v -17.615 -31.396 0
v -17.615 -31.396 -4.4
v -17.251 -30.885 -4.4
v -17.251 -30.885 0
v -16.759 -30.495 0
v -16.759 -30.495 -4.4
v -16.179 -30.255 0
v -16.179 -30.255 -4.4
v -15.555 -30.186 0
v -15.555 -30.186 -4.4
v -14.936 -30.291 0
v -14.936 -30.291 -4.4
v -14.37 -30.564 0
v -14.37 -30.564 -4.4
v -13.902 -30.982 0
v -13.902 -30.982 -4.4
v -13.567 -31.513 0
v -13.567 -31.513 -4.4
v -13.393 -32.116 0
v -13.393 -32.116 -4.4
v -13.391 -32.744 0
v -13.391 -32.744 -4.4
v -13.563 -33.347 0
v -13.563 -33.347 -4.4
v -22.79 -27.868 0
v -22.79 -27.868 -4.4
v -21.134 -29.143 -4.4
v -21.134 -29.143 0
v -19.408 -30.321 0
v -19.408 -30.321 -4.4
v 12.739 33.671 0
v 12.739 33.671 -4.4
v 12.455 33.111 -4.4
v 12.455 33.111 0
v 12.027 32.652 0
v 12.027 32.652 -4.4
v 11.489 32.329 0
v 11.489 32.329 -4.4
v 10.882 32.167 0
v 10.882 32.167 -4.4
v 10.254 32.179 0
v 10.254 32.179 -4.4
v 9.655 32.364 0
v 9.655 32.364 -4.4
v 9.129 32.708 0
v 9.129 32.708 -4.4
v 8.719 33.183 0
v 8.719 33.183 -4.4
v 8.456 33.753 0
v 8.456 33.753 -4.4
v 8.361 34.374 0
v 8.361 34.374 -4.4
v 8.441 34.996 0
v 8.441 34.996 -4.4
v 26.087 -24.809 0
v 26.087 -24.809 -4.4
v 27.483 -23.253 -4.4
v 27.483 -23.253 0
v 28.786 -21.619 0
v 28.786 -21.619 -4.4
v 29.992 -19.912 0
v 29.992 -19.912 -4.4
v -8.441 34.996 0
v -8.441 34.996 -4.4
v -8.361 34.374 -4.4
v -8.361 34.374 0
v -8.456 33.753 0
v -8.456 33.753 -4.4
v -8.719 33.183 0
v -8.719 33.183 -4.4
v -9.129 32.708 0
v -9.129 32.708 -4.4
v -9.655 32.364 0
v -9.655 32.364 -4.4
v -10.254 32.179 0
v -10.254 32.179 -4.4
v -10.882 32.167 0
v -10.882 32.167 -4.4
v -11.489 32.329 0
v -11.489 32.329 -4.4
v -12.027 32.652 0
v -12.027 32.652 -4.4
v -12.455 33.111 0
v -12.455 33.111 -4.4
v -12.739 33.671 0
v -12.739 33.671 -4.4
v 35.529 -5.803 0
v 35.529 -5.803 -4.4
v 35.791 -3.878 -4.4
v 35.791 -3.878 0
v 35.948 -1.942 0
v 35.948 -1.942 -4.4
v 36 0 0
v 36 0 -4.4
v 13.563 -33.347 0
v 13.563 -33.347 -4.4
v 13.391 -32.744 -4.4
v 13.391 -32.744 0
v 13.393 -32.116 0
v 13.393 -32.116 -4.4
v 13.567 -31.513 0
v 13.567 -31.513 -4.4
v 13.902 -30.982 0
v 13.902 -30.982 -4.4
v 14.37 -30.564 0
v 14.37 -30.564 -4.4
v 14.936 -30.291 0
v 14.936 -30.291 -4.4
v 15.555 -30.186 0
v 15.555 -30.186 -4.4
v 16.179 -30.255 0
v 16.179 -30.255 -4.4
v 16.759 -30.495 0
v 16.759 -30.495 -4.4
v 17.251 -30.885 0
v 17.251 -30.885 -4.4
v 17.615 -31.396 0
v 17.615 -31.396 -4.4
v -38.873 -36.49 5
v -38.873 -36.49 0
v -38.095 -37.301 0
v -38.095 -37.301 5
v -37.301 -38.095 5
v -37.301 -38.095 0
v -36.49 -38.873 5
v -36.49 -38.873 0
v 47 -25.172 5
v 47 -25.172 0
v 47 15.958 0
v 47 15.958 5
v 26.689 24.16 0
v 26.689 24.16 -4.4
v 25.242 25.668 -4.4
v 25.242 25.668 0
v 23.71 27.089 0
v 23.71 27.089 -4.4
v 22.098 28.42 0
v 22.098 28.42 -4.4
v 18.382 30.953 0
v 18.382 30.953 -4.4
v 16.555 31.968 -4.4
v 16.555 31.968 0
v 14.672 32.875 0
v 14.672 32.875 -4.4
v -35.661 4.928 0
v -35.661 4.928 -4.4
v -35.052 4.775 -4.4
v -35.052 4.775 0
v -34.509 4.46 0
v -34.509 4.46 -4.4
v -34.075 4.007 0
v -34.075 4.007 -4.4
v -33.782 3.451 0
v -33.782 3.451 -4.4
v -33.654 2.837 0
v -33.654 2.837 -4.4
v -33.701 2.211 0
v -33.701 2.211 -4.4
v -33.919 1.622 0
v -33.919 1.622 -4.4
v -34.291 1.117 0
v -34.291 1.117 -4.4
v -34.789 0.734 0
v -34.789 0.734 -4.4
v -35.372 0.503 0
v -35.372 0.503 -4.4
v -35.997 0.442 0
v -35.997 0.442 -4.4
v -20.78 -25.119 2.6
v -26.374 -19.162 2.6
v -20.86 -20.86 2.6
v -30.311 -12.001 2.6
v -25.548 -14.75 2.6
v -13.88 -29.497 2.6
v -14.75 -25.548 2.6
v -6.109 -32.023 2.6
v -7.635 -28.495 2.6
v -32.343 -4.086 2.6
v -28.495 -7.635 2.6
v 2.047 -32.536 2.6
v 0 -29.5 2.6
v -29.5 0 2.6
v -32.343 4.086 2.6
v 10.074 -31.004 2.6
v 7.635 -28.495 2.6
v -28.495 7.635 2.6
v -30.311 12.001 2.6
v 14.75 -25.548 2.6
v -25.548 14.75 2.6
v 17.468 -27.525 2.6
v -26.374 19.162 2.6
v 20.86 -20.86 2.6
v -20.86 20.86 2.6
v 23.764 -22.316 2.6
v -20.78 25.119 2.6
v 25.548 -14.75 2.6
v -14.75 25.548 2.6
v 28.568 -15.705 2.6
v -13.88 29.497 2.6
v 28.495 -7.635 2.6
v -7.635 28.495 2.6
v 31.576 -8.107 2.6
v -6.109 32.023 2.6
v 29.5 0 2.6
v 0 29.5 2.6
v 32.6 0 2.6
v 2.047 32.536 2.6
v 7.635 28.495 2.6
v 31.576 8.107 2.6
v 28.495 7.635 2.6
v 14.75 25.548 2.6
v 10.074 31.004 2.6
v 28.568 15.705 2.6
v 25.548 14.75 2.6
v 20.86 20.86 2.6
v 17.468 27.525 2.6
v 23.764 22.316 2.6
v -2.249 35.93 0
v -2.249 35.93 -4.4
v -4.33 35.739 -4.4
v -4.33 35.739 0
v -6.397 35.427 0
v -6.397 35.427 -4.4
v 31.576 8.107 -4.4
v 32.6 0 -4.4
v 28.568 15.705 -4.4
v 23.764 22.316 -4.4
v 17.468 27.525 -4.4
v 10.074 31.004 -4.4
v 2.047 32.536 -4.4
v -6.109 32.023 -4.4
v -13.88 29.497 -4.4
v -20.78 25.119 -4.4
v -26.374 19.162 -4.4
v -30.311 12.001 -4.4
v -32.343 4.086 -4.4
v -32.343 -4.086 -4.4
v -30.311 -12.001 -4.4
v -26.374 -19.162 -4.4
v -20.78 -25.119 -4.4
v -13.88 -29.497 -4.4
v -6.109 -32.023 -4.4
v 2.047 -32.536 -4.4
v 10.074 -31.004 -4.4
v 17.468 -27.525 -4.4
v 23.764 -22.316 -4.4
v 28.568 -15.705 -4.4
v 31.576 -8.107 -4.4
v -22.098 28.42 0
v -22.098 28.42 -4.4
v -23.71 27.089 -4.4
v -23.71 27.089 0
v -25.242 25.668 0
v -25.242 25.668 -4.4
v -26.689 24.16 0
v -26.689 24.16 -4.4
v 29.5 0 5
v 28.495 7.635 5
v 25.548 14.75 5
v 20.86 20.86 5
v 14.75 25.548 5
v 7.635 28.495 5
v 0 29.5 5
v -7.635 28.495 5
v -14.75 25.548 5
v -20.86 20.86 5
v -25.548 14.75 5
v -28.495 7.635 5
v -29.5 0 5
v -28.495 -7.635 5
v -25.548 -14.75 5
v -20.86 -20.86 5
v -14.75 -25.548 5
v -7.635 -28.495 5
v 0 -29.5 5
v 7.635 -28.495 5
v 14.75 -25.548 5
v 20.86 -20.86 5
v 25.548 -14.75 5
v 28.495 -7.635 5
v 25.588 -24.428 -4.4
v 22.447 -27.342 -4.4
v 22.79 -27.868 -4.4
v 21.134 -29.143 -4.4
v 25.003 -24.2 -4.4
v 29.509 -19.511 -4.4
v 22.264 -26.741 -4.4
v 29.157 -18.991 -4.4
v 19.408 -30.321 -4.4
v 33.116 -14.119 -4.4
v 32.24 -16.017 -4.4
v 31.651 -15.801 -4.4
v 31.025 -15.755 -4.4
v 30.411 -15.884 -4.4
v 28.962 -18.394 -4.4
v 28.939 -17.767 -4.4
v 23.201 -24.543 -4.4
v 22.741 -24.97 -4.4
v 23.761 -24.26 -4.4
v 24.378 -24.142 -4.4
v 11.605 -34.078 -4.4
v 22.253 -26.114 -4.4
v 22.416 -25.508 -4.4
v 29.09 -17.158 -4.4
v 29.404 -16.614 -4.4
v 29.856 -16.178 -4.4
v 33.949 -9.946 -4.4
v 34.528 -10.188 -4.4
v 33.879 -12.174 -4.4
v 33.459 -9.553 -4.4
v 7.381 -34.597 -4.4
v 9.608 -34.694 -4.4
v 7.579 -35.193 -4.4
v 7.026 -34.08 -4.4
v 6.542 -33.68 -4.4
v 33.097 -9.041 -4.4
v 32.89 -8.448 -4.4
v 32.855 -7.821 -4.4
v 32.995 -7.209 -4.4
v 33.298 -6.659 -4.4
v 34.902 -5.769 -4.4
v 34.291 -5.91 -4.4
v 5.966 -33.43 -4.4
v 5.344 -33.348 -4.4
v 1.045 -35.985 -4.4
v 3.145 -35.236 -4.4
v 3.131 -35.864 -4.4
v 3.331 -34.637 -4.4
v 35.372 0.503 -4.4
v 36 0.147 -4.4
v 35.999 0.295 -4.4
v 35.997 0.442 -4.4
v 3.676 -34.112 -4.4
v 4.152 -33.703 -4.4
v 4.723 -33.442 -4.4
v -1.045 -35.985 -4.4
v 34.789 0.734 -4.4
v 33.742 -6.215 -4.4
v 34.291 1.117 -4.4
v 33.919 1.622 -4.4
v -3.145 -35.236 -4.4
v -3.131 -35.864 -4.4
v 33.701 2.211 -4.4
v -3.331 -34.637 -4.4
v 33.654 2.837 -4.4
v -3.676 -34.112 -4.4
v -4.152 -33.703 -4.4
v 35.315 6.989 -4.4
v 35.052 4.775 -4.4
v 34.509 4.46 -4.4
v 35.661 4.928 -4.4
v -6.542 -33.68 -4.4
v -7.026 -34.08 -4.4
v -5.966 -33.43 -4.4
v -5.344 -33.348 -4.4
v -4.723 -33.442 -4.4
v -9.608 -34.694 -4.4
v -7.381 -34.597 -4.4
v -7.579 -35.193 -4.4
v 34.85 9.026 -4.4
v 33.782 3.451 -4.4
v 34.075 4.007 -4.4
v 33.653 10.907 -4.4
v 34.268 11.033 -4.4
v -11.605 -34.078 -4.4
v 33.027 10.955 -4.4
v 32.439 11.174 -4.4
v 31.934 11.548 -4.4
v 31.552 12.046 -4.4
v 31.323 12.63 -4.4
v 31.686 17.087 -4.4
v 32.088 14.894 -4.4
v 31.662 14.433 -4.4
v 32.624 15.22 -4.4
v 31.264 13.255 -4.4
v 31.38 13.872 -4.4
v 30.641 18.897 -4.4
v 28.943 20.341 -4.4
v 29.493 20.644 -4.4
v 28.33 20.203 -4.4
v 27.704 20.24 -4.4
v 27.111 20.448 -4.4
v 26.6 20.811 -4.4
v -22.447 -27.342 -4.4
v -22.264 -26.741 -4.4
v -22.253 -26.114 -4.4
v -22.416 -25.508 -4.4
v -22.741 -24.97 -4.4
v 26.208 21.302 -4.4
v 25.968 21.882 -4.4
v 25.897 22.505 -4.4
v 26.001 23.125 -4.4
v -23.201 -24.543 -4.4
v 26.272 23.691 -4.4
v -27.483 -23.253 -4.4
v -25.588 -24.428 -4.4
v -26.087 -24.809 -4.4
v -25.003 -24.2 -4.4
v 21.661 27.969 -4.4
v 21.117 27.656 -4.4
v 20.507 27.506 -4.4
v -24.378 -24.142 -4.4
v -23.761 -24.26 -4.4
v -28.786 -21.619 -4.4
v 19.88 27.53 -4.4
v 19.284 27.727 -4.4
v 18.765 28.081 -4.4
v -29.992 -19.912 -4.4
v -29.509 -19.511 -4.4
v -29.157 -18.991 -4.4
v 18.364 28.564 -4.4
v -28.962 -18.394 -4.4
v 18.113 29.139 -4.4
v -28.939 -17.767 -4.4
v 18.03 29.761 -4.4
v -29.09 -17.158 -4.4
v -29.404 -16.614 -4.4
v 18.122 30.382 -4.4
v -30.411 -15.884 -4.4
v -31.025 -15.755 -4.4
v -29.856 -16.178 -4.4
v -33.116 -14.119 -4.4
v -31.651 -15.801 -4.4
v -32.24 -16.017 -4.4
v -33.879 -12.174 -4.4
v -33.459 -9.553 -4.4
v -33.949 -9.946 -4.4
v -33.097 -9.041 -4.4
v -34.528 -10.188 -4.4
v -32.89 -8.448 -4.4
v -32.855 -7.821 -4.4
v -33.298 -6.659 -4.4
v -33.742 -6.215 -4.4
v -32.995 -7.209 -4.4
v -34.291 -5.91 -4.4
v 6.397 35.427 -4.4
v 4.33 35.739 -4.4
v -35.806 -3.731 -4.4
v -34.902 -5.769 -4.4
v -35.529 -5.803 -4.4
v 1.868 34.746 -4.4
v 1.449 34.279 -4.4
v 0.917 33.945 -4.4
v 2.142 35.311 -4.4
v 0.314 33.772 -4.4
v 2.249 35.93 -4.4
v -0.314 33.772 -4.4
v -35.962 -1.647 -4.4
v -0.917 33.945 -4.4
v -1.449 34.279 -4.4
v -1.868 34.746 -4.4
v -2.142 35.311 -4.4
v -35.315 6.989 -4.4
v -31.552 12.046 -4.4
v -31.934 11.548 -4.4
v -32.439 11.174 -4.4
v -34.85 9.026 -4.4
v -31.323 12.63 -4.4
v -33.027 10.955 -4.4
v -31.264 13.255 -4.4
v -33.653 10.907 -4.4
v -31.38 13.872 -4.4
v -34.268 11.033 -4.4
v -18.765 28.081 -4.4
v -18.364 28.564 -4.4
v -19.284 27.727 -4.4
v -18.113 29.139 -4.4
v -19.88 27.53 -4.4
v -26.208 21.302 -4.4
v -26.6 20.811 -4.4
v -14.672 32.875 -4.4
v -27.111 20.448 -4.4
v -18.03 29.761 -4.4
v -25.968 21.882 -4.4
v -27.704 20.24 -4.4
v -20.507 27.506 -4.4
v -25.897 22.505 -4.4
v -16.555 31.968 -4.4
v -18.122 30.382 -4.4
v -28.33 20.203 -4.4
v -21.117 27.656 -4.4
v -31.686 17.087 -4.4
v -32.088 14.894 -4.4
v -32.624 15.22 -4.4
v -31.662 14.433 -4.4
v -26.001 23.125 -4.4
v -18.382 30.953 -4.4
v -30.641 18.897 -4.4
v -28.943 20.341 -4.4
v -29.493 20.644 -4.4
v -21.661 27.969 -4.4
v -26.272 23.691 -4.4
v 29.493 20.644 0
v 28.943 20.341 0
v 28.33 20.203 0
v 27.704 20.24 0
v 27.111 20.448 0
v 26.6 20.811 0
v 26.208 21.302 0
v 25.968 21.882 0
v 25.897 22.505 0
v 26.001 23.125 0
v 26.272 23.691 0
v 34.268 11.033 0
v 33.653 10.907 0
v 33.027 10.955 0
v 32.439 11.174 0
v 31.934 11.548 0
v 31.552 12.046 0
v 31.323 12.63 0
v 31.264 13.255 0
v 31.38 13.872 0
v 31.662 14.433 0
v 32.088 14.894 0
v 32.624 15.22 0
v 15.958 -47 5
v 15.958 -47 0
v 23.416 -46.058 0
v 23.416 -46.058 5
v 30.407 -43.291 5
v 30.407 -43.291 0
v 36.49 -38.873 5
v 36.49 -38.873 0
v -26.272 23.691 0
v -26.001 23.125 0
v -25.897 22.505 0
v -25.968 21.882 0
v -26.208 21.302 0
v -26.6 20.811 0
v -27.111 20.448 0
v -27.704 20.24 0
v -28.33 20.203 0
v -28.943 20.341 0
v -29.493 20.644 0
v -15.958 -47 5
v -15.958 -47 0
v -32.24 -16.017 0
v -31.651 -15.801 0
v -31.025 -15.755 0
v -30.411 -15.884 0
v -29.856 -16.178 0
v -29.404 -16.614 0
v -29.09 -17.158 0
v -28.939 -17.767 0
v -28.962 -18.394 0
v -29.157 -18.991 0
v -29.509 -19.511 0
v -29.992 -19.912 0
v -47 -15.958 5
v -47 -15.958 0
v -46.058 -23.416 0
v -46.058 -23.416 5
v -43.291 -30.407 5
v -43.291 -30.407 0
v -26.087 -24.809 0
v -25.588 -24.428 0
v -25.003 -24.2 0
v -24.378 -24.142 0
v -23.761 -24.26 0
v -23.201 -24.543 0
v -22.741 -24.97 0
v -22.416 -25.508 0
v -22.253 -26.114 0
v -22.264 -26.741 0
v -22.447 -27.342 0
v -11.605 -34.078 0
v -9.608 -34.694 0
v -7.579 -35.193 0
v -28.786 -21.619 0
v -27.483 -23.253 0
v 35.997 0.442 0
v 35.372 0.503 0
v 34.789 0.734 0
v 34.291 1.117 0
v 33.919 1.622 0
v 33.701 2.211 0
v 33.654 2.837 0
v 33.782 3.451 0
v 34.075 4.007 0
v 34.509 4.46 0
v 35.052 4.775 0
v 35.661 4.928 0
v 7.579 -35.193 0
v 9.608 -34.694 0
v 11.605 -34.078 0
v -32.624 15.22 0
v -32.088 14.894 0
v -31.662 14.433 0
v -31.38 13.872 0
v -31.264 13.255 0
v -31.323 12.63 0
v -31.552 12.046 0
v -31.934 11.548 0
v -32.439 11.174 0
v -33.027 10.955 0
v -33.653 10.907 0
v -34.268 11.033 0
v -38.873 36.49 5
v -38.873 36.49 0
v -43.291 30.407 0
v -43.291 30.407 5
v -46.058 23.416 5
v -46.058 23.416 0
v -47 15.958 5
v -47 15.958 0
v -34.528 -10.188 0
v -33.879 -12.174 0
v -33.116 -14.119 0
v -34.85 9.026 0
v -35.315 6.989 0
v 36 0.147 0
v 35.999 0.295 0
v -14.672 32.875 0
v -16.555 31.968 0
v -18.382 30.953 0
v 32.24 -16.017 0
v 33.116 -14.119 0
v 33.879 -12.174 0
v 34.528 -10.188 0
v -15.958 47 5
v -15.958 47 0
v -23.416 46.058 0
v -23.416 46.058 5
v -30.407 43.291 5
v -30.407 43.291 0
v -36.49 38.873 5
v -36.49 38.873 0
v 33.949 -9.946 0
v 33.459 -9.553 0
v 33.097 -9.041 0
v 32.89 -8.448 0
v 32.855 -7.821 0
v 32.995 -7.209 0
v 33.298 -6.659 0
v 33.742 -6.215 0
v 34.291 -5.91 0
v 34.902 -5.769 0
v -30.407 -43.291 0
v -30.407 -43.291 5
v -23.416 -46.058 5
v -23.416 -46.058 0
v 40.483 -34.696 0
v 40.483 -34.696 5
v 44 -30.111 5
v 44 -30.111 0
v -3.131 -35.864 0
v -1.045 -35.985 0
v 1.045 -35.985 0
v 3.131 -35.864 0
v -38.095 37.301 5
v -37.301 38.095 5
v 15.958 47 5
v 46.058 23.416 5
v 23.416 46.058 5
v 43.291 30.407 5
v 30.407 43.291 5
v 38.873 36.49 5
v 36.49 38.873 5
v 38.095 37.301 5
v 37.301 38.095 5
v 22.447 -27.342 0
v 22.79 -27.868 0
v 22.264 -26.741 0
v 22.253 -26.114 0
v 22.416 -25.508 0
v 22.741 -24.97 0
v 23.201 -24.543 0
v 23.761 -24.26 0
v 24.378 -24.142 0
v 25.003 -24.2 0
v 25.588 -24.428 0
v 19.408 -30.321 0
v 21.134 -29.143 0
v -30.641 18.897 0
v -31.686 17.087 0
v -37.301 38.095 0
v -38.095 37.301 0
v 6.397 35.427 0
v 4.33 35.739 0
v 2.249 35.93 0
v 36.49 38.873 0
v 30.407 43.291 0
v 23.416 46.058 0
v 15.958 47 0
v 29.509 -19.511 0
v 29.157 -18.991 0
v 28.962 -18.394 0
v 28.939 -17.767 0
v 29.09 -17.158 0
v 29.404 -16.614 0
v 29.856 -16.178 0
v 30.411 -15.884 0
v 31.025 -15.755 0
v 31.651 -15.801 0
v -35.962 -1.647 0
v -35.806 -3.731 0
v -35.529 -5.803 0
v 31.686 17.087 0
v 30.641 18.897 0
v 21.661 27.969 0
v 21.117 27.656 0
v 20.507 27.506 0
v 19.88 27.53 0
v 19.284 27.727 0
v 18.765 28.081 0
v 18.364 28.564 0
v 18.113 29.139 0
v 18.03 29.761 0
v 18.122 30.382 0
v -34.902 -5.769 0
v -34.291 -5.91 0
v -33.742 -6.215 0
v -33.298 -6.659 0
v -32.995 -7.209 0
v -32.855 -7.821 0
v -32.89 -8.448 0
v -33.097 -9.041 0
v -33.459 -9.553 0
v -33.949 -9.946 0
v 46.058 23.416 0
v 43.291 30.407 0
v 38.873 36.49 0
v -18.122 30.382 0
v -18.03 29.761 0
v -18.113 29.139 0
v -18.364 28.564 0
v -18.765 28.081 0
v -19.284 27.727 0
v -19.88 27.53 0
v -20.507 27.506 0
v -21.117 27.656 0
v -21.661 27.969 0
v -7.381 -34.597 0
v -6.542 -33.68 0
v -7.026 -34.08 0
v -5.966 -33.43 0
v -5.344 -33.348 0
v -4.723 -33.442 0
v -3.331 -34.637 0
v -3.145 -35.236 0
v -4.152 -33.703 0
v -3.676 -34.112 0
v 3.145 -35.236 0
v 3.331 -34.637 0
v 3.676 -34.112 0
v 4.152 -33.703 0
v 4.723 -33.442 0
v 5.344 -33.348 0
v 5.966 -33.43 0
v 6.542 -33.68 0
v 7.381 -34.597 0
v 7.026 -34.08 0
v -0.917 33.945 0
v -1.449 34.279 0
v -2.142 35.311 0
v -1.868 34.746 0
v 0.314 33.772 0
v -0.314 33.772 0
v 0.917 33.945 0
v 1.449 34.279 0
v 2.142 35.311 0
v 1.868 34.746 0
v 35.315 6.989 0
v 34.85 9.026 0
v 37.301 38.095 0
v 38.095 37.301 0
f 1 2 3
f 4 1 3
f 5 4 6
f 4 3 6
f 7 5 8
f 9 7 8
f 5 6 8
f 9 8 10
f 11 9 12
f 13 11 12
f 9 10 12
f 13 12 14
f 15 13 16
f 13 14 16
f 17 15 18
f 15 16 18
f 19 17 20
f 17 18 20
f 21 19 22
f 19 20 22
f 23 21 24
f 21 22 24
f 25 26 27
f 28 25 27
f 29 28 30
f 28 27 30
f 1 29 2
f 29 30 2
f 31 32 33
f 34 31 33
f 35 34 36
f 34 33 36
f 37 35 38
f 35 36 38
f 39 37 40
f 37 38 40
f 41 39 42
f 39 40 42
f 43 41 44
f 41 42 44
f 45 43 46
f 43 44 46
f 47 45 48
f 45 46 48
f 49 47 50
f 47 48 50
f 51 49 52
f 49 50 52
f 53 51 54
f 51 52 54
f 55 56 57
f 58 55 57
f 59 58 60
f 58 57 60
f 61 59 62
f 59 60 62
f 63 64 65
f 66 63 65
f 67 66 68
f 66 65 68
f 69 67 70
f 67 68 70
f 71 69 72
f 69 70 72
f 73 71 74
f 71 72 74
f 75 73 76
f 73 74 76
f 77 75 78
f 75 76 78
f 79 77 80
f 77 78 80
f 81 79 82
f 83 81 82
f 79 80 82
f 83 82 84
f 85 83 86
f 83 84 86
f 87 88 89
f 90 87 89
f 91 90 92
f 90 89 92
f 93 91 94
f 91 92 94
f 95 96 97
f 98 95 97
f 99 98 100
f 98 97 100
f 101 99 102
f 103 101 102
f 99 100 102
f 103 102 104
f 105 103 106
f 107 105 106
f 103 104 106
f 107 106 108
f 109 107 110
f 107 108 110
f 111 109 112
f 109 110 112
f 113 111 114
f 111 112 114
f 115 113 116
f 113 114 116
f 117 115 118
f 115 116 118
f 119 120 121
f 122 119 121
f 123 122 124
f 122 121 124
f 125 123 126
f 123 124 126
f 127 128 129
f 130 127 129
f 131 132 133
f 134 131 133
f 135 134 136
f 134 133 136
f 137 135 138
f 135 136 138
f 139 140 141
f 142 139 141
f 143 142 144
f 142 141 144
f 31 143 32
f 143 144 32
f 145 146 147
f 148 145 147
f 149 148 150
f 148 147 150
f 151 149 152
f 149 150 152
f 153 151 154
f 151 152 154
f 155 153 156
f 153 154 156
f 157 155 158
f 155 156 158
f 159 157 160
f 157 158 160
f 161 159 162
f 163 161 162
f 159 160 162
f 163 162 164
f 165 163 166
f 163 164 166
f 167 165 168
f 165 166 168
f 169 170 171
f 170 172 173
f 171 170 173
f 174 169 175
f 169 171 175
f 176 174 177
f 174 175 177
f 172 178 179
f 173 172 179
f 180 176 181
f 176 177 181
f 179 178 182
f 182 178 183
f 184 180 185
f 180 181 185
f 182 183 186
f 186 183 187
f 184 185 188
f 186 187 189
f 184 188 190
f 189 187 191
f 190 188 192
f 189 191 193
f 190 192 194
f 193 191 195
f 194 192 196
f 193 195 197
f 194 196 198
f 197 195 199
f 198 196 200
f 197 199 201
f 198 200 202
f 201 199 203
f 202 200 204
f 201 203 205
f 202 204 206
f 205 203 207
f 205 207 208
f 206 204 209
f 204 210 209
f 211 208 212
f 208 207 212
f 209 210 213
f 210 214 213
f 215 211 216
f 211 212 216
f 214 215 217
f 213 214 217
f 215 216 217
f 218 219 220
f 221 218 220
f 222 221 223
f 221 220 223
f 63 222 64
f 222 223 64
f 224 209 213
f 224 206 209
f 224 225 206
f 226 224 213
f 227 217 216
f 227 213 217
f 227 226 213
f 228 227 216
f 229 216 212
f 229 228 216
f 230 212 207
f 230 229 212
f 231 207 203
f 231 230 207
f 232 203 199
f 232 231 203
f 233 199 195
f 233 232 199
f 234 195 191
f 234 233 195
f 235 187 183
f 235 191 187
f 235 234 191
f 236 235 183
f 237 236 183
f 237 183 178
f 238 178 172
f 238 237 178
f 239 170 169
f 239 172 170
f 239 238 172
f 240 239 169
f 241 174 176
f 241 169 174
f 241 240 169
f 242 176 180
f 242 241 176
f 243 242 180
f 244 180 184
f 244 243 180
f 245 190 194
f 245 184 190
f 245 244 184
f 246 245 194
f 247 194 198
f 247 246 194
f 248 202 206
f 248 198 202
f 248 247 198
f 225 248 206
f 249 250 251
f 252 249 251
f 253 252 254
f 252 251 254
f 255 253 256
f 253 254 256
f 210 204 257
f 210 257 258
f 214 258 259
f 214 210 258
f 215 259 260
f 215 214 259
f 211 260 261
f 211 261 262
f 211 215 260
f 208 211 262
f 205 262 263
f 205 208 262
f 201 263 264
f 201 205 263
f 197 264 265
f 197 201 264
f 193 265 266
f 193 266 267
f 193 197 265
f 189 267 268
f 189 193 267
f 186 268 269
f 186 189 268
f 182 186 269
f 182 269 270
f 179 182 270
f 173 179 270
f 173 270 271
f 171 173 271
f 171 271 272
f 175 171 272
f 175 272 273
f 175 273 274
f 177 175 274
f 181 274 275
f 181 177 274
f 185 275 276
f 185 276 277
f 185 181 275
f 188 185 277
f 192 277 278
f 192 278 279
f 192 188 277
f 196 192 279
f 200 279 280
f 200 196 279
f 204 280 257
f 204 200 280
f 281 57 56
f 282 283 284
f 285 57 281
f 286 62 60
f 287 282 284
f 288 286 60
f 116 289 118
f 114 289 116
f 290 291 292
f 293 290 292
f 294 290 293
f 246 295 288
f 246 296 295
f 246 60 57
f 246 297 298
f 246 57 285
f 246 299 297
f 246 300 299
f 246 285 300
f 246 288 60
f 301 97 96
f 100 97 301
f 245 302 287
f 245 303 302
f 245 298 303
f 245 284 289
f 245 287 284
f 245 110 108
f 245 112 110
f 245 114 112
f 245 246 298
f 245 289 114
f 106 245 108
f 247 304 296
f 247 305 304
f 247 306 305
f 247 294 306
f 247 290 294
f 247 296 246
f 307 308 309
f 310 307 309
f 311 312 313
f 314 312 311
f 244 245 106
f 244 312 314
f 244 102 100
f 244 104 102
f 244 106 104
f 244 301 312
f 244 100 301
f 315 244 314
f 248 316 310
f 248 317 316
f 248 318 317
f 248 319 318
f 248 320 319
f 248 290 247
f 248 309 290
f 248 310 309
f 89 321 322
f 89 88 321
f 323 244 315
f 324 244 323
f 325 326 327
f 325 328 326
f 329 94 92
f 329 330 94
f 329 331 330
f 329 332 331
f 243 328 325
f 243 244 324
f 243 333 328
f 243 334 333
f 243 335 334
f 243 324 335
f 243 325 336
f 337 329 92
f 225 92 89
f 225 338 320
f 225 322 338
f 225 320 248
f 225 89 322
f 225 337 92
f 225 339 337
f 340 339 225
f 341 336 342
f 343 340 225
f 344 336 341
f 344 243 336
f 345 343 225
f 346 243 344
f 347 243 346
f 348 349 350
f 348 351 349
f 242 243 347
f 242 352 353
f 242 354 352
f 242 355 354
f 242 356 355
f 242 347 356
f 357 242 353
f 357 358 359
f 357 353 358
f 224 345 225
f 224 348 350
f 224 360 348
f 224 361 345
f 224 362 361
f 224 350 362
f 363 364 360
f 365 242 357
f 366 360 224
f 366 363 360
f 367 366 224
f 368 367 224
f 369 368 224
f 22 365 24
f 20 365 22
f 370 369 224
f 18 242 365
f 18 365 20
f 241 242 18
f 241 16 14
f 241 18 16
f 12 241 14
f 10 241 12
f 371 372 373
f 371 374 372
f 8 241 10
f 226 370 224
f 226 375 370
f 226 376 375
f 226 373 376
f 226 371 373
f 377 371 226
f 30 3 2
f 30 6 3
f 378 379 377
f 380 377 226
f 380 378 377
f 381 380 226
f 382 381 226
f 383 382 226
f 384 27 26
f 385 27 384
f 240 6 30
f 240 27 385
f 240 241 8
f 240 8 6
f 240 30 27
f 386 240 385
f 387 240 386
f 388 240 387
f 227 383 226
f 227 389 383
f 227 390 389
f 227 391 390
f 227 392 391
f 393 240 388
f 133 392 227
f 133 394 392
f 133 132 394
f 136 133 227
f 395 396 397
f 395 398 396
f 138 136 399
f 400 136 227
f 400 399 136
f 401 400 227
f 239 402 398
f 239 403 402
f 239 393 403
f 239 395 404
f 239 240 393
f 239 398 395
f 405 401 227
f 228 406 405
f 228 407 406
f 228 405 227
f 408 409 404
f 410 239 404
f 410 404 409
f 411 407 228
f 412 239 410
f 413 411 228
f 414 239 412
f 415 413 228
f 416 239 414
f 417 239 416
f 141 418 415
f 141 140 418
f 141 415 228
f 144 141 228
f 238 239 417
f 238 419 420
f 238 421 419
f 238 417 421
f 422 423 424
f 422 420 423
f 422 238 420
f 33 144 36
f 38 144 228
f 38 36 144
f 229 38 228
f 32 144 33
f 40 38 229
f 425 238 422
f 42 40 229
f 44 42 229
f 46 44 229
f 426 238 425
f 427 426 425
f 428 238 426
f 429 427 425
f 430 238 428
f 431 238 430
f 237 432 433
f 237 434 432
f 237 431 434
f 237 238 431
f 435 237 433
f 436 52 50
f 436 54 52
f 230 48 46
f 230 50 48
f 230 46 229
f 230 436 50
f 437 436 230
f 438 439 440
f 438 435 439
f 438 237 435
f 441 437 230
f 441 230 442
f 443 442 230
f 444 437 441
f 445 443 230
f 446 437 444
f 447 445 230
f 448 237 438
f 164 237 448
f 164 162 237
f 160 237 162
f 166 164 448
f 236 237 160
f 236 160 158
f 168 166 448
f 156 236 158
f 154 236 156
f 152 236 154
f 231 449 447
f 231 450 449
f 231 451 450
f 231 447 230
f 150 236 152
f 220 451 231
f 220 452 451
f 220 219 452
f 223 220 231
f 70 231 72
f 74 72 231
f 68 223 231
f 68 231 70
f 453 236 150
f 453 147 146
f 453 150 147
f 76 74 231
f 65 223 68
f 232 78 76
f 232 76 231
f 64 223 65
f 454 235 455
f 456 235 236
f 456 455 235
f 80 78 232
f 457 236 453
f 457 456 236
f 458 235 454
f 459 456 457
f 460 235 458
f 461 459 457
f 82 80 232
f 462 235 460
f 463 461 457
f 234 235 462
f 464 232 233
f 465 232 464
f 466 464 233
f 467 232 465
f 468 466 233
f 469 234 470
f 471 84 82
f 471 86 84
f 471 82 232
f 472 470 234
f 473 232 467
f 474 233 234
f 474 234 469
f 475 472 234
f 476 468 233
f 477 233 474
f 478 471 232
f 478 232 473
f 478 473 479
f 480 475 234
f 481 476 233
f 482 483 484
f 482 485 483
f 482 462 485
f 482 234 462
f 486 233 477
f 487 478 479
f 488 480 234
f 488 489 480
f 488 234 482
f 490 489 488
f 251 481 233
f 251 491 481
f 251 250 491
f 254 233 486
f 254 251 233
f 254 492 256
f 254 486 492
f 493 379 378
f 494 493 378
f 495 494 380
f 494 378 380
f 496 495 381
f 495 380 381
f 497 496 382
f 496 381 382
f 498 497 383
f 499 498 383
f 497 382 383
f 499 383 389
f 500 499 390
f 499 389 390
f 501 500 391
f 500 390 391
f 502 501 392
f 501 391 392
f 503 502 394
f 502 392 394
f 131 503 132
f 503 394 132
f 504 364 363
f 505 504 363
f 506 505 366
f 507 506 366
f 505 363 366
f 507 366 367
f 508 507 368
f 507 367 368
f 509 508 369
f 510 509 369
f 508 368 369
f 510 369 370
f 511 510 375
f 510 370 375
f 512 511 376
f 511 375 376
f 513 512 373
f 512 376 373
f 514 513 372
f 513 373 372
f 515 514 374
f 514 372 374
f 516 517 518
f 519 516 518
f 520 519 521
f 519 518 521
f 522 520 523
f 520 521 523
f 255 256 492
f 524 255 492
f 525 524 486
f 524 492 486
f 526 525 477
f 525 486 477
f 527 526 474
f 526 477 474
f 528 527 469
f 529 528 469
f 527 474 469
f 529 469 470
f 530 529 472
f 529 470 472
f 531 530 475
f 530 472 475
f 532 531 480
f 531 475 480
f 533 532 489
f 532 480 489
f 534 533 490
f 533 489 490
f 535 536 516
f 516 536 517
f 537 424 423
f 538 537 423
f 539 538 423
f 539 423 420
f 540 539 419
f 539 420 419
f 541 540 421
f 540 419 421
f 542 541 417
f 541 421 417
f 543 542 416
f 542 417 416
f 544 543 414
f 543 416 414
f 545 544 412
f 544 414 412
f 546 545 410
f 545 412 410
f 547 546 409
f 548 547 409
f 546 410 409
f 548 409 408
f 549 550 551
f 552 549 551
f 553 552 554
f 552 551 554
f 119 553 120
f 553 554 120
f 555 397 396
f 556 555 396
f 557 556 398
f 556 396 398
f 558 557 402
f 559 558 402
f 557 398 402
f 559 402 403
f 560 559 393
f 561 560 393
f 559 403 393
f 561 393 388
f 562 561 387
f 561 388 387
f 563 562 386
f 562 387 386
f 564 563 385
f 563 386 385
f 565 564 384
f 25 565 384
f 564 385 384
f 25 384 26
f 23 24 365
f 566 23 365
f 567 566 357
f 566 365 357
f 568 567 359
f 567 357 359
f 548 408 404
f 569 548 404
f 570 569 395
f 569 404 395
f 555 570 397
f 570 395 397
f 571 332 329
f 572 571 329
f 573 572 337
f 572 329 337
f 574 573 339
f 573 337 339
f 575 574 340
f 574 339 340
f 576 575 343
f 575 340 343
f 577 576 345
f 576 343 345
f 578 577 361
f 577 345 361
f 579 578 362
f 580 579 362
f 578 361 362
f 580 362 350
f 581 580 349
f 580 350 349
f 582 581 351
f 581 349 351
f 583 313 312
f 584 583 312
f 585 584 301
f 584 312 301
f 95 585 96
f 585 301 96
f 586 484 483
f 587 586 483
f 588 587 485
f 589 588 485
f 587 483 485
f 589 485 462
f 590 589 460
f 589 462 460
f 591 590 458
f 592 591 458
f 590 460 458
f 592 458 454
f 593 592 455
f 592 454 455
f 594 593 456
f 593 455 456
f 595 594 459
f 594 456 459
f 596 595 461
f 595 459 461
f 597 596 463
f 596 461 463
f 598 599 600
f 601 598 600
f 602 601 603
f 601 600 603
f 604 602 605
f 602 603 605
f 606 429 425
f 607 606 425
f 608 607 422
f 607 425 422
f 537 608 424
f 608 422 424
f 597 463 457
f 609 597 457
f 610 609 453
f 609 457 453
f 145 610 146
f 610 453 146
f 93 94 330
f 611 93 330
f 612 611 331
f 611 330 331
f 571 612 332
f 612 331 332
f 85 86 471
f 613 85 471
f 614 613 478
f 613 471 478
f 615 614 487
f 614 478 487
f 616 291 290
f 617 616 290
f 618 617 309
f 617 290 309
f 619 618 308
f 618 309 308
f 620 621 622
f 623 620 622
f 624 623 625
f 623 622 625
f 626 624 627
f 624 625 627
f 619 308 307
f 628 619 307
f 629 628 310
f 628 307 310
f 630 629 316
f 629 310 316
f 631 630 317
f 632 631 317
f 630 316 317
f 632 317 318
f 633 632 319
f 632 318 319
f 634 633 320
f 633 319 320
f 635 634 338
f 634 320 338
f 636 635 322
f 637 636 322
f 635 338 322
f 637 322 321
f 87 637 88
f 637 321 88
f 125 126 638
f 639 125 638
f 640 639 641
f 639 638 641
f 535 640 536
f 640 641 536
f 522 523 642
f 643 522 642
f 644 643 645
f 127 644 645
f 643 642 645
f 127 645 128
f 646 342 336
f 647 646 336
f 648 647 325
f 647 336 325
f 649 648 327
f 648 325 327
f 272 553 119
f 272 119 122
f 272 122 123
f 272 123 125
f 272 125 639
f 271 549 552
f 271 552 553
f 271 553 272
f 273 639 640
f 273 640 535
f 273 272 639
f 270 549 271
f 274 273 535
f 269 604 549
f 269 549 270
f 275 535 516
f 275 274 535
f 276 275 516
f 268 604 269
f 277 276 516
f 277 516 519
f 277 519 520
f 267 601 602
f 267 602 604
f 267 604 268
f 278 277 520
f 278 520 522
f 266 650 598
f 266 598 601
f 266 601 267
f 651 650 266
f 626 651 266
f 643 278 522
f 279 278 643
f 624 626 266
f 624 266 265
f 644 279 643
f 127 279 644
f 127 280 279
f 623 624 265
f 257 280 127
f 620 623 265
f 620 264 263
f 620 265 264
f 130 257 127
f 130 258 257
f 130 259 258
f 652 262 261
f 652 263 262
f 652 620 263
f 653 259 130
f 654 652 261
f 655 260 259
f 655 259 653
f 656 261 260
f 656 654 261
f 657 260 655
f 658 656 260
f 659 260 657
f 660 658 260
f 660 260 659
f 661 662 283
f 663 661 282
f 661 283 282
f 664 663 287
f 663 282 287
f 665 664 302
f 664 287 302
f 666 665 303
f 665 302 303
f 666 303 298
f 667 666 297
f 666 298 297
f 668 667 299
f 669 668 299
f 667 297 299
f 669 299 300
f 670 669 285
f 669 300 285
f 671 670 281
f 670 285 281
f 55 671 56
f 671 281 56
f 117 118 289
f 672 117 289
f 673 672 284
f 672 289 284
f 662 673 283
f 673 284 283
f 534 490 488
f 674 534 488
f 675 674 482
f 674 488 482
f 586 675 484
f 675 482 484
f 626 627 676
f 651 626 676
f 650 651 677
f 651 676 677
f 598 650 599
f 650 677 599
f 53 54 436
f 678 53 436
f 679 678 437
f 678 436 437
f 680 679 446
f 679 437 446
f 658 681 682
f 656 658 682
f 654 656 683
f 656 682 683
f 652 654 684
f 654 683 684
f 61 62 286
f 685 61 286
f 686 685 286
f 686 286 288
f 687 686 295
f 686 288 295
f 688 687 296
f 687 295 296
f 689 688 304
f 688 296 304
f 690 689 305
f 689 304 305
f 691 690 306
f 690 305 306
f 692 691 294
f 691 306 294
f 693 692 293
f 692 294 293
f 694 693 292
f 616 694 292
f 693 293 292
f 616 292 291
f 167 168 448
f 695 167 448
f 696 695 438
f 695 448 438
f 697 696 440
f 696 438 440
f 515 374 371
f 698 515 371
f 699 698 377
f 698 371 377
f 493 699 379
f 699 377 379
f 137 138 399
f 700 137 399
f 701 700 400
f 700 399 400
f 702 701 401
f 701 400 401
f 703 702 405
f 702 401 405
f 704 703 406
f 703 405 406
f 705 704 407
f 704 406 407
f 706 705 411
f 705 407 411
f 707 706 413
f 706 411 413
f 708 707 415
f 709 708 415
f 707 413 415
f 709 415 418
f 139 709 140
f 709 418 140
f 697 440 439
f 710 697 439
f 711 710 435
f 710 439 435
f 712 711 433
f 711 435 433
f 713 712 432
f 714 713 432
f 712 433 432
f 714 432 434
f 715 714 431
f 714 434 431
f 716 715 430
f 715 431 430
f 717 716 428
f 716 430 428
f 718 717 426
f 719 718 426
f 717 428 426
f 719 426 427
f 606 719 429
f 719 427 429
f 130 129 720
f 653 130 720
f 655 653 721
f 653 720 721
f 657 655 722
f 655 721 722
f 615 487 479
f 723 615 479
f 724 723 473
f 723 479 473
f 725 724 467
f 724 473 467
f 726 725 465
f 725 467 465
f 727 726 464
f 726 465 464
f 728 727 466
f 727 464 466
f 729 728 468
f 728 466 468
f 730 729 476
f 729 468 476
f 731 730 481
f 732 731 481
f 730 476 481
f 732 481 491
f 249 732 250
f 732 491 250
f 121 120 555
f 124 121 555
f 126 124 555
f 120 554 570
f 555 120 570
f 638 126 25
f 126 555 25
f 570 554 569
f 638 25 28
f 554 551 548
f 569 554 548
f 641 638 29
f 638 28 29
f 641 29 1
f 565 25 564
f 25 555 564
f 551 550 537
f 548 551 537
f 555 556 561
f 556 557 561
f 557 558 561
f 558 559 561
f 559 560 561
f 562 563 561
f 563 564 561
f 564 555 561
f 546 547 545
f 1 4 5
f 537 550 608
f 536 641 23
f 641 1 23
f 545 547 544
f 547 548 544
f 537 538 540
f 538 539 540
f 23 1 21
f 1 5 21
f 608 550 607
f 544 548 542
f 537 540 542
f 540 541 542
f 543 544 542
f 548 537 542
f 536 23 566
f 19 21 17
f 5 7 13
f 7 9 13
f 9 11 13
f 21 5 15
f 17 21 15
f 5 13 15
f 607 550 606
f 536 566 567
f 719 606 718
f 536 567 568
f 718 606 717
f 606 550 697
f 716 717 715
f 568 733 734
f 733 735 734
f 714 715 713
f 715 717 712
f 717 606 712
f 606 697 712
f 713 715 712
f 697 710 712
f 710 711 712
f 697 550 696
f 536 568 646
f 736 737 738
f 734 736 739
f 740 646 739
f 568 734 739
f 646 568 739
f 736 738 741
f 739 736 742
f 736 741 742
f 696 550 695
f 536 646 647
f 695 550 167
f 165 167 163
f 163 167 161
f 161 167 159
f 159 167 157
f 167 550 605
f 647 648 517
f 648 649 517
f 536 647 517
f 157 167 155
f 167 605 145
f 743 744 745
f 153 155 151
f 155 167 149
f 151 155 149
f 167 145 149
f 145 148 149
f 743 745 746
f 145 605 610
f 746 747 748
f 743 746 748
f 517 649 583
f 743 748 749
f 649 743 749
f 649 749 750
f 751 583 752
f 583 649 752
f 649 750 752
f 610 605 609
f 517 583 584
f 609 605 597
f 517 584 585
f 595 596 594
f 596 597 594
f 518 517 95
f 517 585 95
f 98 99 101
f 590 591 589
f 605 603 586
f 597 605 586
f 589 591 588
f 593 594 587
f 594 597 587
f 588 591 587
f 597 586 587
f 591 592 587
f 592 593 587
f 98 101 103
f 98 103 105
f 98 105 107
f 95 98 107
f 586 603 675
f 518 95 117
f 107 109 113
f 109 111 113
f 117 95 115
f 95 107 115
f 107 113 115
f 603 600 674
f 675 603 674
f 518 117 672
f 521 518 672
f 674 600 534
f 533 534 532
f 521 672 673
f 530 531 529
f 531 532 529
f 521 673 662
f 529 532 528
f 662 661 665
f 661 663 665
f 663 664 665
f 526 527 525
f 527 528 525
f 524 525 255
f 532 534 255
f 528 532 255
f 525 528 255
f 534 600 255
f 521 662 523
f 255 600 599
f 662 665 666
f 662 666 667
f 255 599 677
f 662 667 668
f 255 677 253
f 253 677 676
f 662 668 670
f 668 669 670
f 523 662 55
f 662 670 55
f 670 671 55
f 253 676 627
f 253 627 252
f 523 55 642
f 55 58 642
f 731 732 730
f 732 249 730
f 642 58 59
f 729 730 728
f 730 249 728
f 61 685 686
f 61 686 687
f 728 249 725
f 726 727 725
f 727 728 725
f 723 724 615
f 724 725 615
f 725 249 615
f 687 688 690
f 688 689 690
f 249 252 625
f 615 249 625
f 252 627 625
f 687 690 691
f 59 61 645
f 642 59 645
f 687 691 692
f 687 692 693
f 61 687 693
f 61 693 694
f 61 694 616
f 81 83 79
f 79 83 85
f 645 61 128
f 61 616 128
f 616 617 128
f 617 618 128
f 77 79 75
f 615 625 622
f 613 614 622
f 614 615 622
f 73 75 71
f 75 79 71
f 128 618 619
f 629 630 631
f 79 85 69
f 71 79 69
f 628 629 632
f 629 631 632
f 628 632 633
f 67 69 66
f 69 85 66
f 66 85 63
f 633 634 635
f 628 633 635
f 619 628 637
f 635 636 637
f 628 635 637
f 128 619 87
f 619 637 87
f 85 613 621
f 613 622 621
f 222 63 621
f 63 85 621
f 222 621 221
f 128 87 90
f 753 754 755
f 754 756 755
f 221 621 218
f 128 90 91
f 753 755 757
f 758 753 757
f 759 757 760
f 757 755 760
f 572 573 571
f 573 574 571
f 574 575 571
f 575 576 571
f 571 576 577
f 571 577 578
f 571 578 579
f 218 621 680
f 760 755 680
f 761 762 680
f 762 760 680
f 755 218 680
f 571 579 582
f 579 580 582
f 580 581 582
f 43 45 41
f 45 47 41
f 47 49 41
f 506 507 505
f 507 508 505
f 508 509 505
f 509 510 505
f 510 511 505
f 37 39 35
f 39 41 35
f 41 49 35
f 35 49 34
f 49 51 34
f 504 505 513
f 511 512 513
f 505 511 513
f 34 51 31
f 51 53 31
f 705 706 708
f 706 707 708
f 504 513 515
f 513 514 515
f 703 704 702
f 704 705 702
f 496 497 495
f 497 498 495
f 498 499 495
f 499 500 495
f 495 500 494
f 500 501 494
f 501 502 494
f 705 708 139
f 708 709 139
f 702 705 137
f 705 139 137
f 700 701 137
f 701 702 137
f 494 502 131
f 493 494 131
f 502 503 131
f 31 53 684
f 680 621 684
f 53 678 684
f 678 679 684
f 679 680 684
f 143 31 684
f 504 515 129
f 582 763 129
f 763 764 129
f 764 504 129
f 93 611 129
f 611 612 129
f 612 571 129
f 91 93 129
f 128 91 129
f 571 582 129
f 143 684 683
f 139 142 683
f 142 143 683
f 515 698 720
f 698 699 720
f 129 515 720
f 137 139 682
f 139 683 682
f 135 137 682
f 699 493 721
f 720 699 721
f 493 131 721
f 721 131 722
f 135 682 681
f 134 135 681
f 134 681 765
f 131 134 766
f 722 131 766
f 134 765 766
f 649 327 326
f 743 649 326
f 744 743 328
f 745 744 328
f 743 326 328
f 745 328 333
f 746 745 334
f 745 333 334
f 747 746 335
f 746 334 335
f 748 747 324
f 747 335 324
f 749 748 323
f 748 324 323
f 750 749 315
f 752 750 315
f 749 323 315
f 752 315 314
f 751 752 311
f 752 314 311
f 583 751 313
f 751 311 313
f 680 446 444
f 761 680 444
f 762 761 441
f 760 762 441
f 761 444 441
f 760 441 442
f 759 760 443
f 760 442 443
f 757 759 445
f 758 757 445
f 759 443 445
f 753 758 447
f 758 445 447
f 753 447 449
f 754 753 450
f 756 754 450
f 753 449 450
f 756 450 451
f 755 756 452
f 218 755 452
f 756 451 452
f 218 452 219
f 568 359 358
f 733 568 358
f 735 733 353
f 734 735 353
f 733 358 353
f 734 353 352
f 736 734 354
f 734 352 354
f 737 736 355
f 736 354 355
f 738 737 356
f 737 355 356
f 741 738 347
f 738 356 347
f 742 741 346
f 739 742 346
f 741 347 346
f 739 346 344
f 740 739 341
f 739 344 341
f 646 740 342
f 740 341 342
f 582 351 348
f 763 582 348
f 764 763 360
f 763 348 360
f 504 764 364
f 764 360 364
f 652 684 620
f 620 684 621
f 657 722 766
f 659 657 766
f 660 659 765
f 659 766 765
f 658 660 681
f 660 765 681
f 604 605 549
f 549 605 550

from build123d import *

# Parameters (mm, degrees)
SKETCH1_R               = 36
BOSS_EXTRUDE1_DEPTH     = 5
BOSS_EXTRUDE2_START     = -4.4
BOSS_EXTRUDE2_DEPTH     = 4.4
BOSS_EXTRUDE3_START     = -5
BOSS_EXTRUDE3_DEPTH     = 5
BOSS_EXTRUDE4_START     = 4.4
SKETCH3_R               = 32.7
SKETCH3_R_2             = 32.6
BOSS_EXTRUDE4_DEPTH     = 4.4
CUT_EXTRUDE1_DEPTH      = 68.129427228
CUT_EXTRUDE1_DEPTH_BACK = 68.129427228
SKETCH4_R               = 32.6
BOSS_EXTRUDE5_START     = -2.4
SKETCH5_R               = 29.5
BOSS_EXTRUDE5_DEPTH     = 2.4


with BuildPart() as part:
    # Sketch1 → Boss-Extrude1 (new body)
    # profile 1 of 3: a face of its own
    with BuildSketch(Plane.XY):
        with BuildLine():
            Line((15.957693357, 47), (-15.957693357, 47))
            ThreePointArc((-15.957693357, 47), (-26.99865268, 44.894394011), (-36.489751331, 38.873147815))
            ThreePointArc((-36.489751331, 38.873147815), (-37.700288946, 37.700288946), (-38.873147815, 36.489751331))
            ThreePointArc((-38.873147815, 36.489751331), (-44.894394011, 26.99865268), (-47, 15.957693357))
            Line((-47, 15.957693357), (-47, -15.957693357))
            ThreePointArc((-47, -15.957693357), (-44.894394011, -26.99865268), (-38.873147815, -36.489751331))
            ThreePointArc((-38.873147815, -36.489751331), (-37.700288946, -37.700288946), (-36.489751331, -38.873147815))
            ThreePointArc((-36.489751331, -38.873147815), (-26.99865268, -44.894394011), (-15.957693357, -47))
            Line((-15.957693357, -47), (15.957693357, -47))
            ThreePointArc((15.957693357, -47), (26.99865268, -44.894394011), (36.489751331, -38.873147815))
            ThreePointArc((36.489751331, -38.873147815), (42.303260219, -32.45085127), (47, -25.171880606))
            Line((47, -25.171880606), (47, 15.957693357))
            ThreePointArc((47, 15.957693357), (44.894394011, 26.99865268), (38.873147815, 36.489751331))
            ThreePointArc((38.873147815, 36.489751331), (37.700288946, 37.700288946), (36.489751331, 38.873147815))
            ThreePointArc((36.489751331, 38.873147815), (26.99865268, 44.894394011), (15.957693357, 47))
        make_face()
        Circle(SKETCH1_R, mode=Mode.SUBTRACT)
    # profile 2 of 3: a face of its own
    with BuildSketch(Plane.XY):
        with BuildLine():
            ThreePointArc((35.529282793, -5.802591166), (35.882127728, -2.910826297), (36, 0))
            ThreePointArc((36, 0), (35.999320343, 0.221212273), (35.997281396, 0.442416194))
            ThreePointArc((35.997281396, 0.442416194), (33.655628155, 2.522140659), (35.661160217, 4.927641625))
            ThreePointArc((35.661160217, 4.927641625), (35.097404839, 8.010753622), (34.267618722, 11.03314584))
            ThreePointArc((34.267618722, 11.03314584), (31.416989017, 12.330259572), (32.62438706, 15.220031833))
            ThreePointArc((32.62438706, 15.220031833), (31.176914536, 18), (29.493127743, 20.64353206))
            ThreePointArc((29.493127743, 20.64353206), (26.386812533, 21.042780813), (26.688793942, 24.16005542))
            ThreePointArc((26.688793942, 24.16005542), (24.48621856, 26.389867386), (22.098042936, 28.419649864))
            ThreePointArc((22.098042936, 28.419649864), (19.01205196, 27.885558633), (18.381784361, 30.953352059))
            ThreePointArc((18.381784361, 30.953352059), (15.619814608, 32.434879244), (12.739450039, 33.67055706))
            ThreePointArc((12.739450039, 33.67055706), (9.947987136, 32.250582195), (8.441472573, 34.996307531))
            ThreePointArc((8.441472573, 34.996307531), (5.365521582, 35.597909744), (2.248901099, 35.9296875))
            ThreePointArc((2.248901099, 35.9296875), (0, 33.75), (-2.248901099, 35.9296875))
            ThreePointArc((-2.248901099, 35.9296875), (-5.365521582, 35.597909744), (-8.441472573, 34.996307531))
            ThreePointArc((-8.441472573, 34.996307531), (-9.947987136, 32.250582195), (-12.739450039, 33.67055706))
            ThreePointArc((-12.739450039, 33.67055706), (-15.619814608, 32.434879244), (-18.381784361, 30.953352059))
            ThreePointArc((-18.381784361, 30.953352059), (-19.01205196, 27.885558633), (-22.098042936, 28.419649864))
            ThreePointArc((-22.098042936, 28.419649864), (-24.48621856, 26.389867386), (-26.688793942, 24.16005542))
            ThreePointArc((-26.688793942, 24.16005542), (-26.386812533, 21.042780813), (-29.493127743, 20.64353206))
            ThreePointArc((-29.493127743, 20.64353206), (-31.176914536, 18), (-32.62438706, 15.220031833))
            ThreePointArc((-32.62438706, 15.220031833), (-31.416989017, 12.330259572), (-34.267618722, 11.03314584))
            ThreePointArc((-34.267618722, 11.03314584), (-35.097404839, 8.010753622), (-35.661160217, 4.927641625))
            ThreePointArc((-35.661160217, 4.927641625), (-33.655628155, 2.522140659), (-35.997281396, 0.442416194))
            ThreePointArc((-35.997281396, 0.442416194), (-35.899336699, -2.690283369), (-35.529282793, -5.802591166))
            ThreePointArc((-35.529282793, -5.802591166), (-32.903817036, -7.510081521), (-34.528427647, -10.187624072))
            ThreePointArc((-34.528427647, -10.187624072), (-33.511454951, -13.152276877), (-32.240472674, -16.017238268))
            ThreePointArc((-32.240472674, -16.017238268), (-29.228357378, -16.875), (-29.991571576, -19.912449232))
            ThreePointArc((-29.991571576, -19.912449232), (-28.145933369, -22.445632867), (-26.086955074, -24.808683459))
            ThreePointArc((-26.086955074, -24.808683459), (-22.9558299, -24.740500674), (-22.789832754, -27.867965894))
            ThreePointArc((-22.789832754, -27.867965894), (-20.27952209, -29.744595875), (-17.615497035, -31.395768253))
            ThreePointArc((-17.615497035, -31.395768253), (-14.643576195, -30.407699292), (-13.563117281, -33.347291489))
            ThreePointArc((-13.563117281, -33.347291489), (-10.611186279, -34.400621008), (-7.57882478, -35.19320126))
            ThreePointArc((-7.57882478, -35.19320126), (-5.030176483, -33.373040385), (-3.131259316, -35.863563893))
            ThreePointArc((-3.131259316, -35.863563893), (0, -36), (3.131259316, -35.863563893))
            ThreePointArc((3.131259316, -35.863563893), (5.030176483, -33.373040385), (7.57882478, -35.19320126))
            ThreePointArc((7.57882478, -35.19320126), (10.611186279, -34.400621008), (13.563117281, -33.347291489))
            ThreePointArc((13.563117281, -33.347291489), (14.643576195, -30.407699292), (17.615497035, -31.395768253))
            ThreePointArc((17.615497035, -31.395768253), (20.27952209, -29.744595875), (22.789832754, -27.867965894))
            ThreePointArc((22.789832754, -27.867965894), (22.9558299, -24.740500674), (26.086955074, -24.808683459))
            ThreePointArc((26.086955074, -24.808683459), (28.145933369, -22.445632867), (29.991571576, -19.912449232))
            ThreePointArc((29.991571576, -19.912449232), (29.228357378, -16.875), (32.240472674, -16.017238268))
            ThreePointArc((32.240472674, -16.017238268), (33.511454951, -13.152276877), (34.528427647, -10.187624072))
            ThreePointArc((34.528427647, -10.187624072), (32.903817036, -7.510081521), (35.529282793, -5.802591166))
        make_face()
        with BuildLine():
            ThreePointArc((-32.7, 0), (0, 32.7), (32.7, 0))
            ThreePointArc((32.7, 0), (0, -32.7), (-32.7, 0))
        make_face(mode=Mode.SUBTRACT)
    # profile 3 of 3: a face of its own
    with BuildSketch(Plane.XY):
        with BuildLine():
            ThreePointArc((32.7, 0), (0, 32.7), (-32.7, 0))
            ThreePointArc((-32.7, 0), (0, -32.7), (32.7, 0))
        make_face()
    extrude(amount=BOSS_EXTRUDE1_DEPTH)

    # Sketch1<4> → Boss-Extrude2 (add)
    with BuildSketch(Plane.XY.offset(BOSS_EXTRUDE2_START)):
        with BuildLine():
            ThreePointArc((35.529282793, -5.802591166), (35.882127728, -2.910826297), (36, 0))
            ThreePointArc((36, 0), (35.999320343, 0.221212273), (35.997281396, 0.442416194))
            ThreePointArc((35.997281396, 0.442416194), (33.655628155, 2.522140659), (35.661160217, 4.927641625))
            ThreePointArc((35.661160217, 4.927641625), (35.097404839, 8.010753622), (34.267618722, 11.03314584))
            ThreePointArc((34.267618722, 11.03314584), (31.416989017, 12.330259572), (32.62438706, 15.220031833))
            ThreePointArc((32.62438706, 15.220031833), (31.176914536, 18), (29.493127743, 20.64353206))
            ThreePointArc((29.493127743, 20.64353206), (26.386812533, 21.042780813), (26.688793942, 24.16005542))
            ThreePointArc((26.688793942, 24.16005542), (24.48621856, 26.389867386), (22.098042936, 28.419649864))
            ThreePointArc((22.098042936, 28.419649864), (19.01205196, 27.885558633), (18.381784361, 30.953352059))
            ThreePointArc((18.381784361, 30.953352059), (15.619814608, 32.434879244), (12.739450039, 33.67055706))
            ThreePointArc((12.739450039, 33.67055706), (9.947987136, 32.250582195), (8.441472573, 34.996307531))
            ThreePointArc((8.441472573, 34.996307531), (5.365521582, 35.597909744), (2.248901099, 35.9296875))
            ThreePointArc((2.248901099, 35.9296875), (0, 33.75), (-2.248901099, 35.9296875))
            ThreePointArc((-2.248901099, 35.9296875), (-5.365521582, 35.597909744), (-8.441472573, 34.996307531))
            ThreePointArc((-8.441472573, 34.996307531), (-9.947987136, 32.250582195), (-12.739450039, 33.67055706))
            ThreePointArc((-12.739450039, 33.67055706), (-15.619814608, 32.434879244), (-18.381784361, 30.953352059))
            ThreePointArc((-18.381784361, 30.953352059), (-19.01205196, 27.885558633), (-22.098042936, 28.419649864))
            ThreePointArc((-22.098042936, 28.419649864), (-24.48621856, 26.389867386), (-26.688793942, 24.16005542))
            ThreePointArc((-26.688793942, 24.16005542), (-26.386812533, 21.042780813), (-29.493127743, 20.64353206))
            ThreePointArc((-29.493127743, 20.64353206), (-31.176914536, 18), (-32.62438706, 15.220031833))
            ThreePointArc((-32.62438706, 15.220031833), (-31.416989017, 12.330259572), (-34.267618722, 11.03314584))
            ThreePointArc((-34.267618722, 11.03314584), (-35.097404839, 8.010753622), (-35.661160217, 4.927641625))
            ThreePointArc((-35.661160217, 4.927641625), (-33.655628155, 2.522140659), (-35.997281396, 0.442416194))
            ThreePointArc((-35.997281396, 0.442416194), (-35.899336699, -2.690283369), (-35.529282793, -5.802591166))
            ThreePointArc((-35.529282793, -5.802591166), (-32.903817036, -7.510081521), (-34.528427647, -10.187624072))
            ThreePointArc((-34.528427647, -10.187624072), (-33.511454951, -13.152276877), (-32.240472674, -16.017238268))
            ThreePointArc((-32.240472674, -16.017238268), (-29.228357378, -16.875), (-29.991571576, -19.912449232))
            ThreePointArc((-29.991571576, -19.912449232), (-28.145933369, -22.445632867), (-26.086955074, -24.808683459))
            ThreePointArc((-26.086955074, -24.808683459), (-22.9558299, -24.740500674), (-22.789832754, -27.867965894))
            ThreePointArc((-22.789832754, -27.867965894), (-20.27952209, -29.744595875), (-17.615497035, -31.395768253))
            ThreePointArc((-17.615497035, -31.395768253), (-14.643576195, -30.407699292), (-13.563117281, -33.347291489))
            ThreePointArc((-13.563117281, -33.347291489), (-10.611186279, -34.400621008), (-7.57882478, -35.19320126))
            ThreePointArc((-7.57882478, -35.19320126), (-5.030176483, -33.373040385), (-3.131259316, -35.863563893))
            ThreePointArc((-3.131259316, -35.863563893), (0, -36), (3.131259316, -35.863563893))
            ThreePointArc((3.131259316, -35.863563893), (5.030176483, -33.373040385), (7.57882478, -35.19320126))
            ThreePointArc((7.57882478, -35.19320126), (10.611186279, -34.400621008), (13.563117281, -33.347291489))
            ThreePointArc((13.563117281, -33.347291489), (14.643576195, -30.407699292), (17.615497035, -31.395768253))
            ThreePointArc((17.615497035, -31.395768253), (20.27952209, -29.744595875), (22.789832754, -27.867965894))
            ThreePointArc((22.789832754, -27.867965894), (22.9558299, -24.740500674), (26.086955074, -24.808683459))
            ThreePointArc((26.086955074, -24.808683459), (28.145933369, -22.445632867), (29.991571576, -19.912449232))
            ThreePointArc((29.991571576, -19.912449232), (29.228357378, -16.875), (32.240472674, -16.017238268))
            ThreePointArc((32.240472674, -16.017238268), (33.511454951, -13.152276877), (34.528427647, -10.187624072))
            ThreePointArc((34.528427647, -10.187624072), (32.903817036, -7.510081521), (35.529282793, -5.802591166))
        make_face()
        with BuildLine():
            ThreePointArc((-32.7, 0), (0, 32.7), (32.7, 0))
            ThreePointArc((32.7, 0), (0, -32.7), (-32.7, 0))
        make_face(mode=Mode.SUBTRACT)
    extrude(amount=BOSS_EXTRUDE2_DEPTH)

    # Sketch2 → Boss-Extrude3 (add)
    with BuildSketch(Plane.XY.offset(5).offset(BOSS_EXTRUDE3_START)):
        with BuildLine():
            Line((15.957693357, 47), (-15.957693357, 47))
            ThreePointArc((-15.957693357, 47), (-26.99865268, 44.894394011), (-36.489751331, 38.873147815))
            ThreePointArc((-36.489751331, 38.873147815), (-37.700288946, 37.700288946), (-38.873147815, 36.489751331))
            ThreePointArc((-38.873147815, 36.489751331), (-44.894394011, 26.99865268), (-47, 15.957693357))
            Line((-47, 15.957693357), (-47, -15.957693357))
            ThreePointArc((-47, -15.957693357), (-44.894394011, -26.99865268), (-38.873147815, -36.489751331))
            ThreePointArc((-38.873147815, -36.489751331), (-37.700288946, -37.700288946), (-36.489751331, -38.873147815))
            ThreePointArc((-36.489751331, -38.873147815), (-26.99865268, -44.894394011), (-15.957693357, -47))
            Line((-15.957693357, -47), (15.957693357, -47))
            ThreePointArc((15.957693357, -47), (26.99865268, -44.894394011), (36.489751331, -38.873147815))
            ThreePointArc((36.489751331, -38.873147815), (42.303260219, -32.45085127), (47, -25.171880606))
            Line((47, -25.171880606), (47, 15.957693357))
            ThreePointArc((47, 15.957693357), (44.894394011, 26.99865268), (38.873147815, 36.489751331))
            ThreePointArc((38.873147815, 36.489751331), (37.700288946, 37.700288946), (36.489751331, 38.873147815))
            ThreePointArc((36.489751331, 38.873147815), (26.99865268, 44.894394011), (15.957693357, 47))
        make_face()
    extrude(amount=BOSS_EXTRUDE3_DEPTH)

    # Sketch3 → Boss-Extrude4 (add)
    with BuildSketch(Plane(origin=(0, 0, 0), x_dir=(-1, 0, 0), z_dir=(0, 0, -1)).offset(BOSS_EXTRUDE4_START)):
        Circle(SKETCH3_R)
        Circle(SKETCH3_R_2, mode=Mode.SUBTRACT)
    extrude(amount=-BOSS_EXTRUDE4_DEPTH)

    # Sketch4 → Cut-Extrude1 (cut, two sides: drawn at the far end of the back side and taken through both)
    with BuildSketch(Plane.XY.offset(5).offset(-CUT_EXTRUDE1_DEPTH_BACK)):
        Circle(SKETCH4_R)
    extrude(amount=CUT_EXTRUDE1_DEPTH + CUT_EXTRUDE1_DEPTH_BACK, mode=Mode.SUBTRACT)

    # Sketch5 → Boss-Extrude5 (add)
    with BuildSketch(Plane.XY.offset(5).offset(BOSS_EXTRUDE5_START)):
        with BuildLine():
            Line((15.957693357, 47), (-15.957693357, 47))
            ThreePointArc((-15.957693357, 47), (-26.99865268, 44.894394011), (-36.489751331, 38.873147815))
            ThreePointArc((-36.489751331, 38.873147815), (-37.700288946, 37.700288946), (-38.873147815, 36.489751331))
            ThreePointArc((-38.873147815, 36.489751331), (-44.894394011, 26.99865268), (-47, 15.957693357))
            Line((-47, 15.957693357), (-47, -15.957693357))
            ThreePointArc((-47, -15.957693357), (-44.894394011, -26.99865268), (-38.873147815, -36.489751331))
            ThreePointArc((-38.873147815, -36.489751331), (-37.700288946, -37.700288946), (-36.489751331, -38.873147815))
            ThreePointArc((-36.489751331, -38.873147815), (-26.99865268, -44.894394011), (-15.957693357, -47))
            Line((-15.957693357, -47), (15.957693357, -47))
            ThreePointArc((15.957693357, -47), (26.99865268, -44.894394011), (36.489751331, -38.873147815))
            ThreePointArc((36.489751331, -38.873147815), (42.303260219, -32.45085127), (47, -25.171880606))
            Line((47, -25.171880606), (47, 15.957693357))
            ThreePointArc((47, 15.957693357), (44.894394011, 26.99865268), (38.873147815, 36.489751331))
            ThreePointArc((38.873147815, 36.489751331), (37.700288946, 37.700288946), (36.489751331, 38.873147815))
            ThreePointArc((36.489751331, 38.873147815), (26.99865268, 44.894394011), (15.957693357, 47))
        make_face()
        Circle(SKETCH5_R, mode=Mode.SUBTRACT)
    extrude(amount=BOSS_EXTRUDE5_DEPTH)


solid = part.part
